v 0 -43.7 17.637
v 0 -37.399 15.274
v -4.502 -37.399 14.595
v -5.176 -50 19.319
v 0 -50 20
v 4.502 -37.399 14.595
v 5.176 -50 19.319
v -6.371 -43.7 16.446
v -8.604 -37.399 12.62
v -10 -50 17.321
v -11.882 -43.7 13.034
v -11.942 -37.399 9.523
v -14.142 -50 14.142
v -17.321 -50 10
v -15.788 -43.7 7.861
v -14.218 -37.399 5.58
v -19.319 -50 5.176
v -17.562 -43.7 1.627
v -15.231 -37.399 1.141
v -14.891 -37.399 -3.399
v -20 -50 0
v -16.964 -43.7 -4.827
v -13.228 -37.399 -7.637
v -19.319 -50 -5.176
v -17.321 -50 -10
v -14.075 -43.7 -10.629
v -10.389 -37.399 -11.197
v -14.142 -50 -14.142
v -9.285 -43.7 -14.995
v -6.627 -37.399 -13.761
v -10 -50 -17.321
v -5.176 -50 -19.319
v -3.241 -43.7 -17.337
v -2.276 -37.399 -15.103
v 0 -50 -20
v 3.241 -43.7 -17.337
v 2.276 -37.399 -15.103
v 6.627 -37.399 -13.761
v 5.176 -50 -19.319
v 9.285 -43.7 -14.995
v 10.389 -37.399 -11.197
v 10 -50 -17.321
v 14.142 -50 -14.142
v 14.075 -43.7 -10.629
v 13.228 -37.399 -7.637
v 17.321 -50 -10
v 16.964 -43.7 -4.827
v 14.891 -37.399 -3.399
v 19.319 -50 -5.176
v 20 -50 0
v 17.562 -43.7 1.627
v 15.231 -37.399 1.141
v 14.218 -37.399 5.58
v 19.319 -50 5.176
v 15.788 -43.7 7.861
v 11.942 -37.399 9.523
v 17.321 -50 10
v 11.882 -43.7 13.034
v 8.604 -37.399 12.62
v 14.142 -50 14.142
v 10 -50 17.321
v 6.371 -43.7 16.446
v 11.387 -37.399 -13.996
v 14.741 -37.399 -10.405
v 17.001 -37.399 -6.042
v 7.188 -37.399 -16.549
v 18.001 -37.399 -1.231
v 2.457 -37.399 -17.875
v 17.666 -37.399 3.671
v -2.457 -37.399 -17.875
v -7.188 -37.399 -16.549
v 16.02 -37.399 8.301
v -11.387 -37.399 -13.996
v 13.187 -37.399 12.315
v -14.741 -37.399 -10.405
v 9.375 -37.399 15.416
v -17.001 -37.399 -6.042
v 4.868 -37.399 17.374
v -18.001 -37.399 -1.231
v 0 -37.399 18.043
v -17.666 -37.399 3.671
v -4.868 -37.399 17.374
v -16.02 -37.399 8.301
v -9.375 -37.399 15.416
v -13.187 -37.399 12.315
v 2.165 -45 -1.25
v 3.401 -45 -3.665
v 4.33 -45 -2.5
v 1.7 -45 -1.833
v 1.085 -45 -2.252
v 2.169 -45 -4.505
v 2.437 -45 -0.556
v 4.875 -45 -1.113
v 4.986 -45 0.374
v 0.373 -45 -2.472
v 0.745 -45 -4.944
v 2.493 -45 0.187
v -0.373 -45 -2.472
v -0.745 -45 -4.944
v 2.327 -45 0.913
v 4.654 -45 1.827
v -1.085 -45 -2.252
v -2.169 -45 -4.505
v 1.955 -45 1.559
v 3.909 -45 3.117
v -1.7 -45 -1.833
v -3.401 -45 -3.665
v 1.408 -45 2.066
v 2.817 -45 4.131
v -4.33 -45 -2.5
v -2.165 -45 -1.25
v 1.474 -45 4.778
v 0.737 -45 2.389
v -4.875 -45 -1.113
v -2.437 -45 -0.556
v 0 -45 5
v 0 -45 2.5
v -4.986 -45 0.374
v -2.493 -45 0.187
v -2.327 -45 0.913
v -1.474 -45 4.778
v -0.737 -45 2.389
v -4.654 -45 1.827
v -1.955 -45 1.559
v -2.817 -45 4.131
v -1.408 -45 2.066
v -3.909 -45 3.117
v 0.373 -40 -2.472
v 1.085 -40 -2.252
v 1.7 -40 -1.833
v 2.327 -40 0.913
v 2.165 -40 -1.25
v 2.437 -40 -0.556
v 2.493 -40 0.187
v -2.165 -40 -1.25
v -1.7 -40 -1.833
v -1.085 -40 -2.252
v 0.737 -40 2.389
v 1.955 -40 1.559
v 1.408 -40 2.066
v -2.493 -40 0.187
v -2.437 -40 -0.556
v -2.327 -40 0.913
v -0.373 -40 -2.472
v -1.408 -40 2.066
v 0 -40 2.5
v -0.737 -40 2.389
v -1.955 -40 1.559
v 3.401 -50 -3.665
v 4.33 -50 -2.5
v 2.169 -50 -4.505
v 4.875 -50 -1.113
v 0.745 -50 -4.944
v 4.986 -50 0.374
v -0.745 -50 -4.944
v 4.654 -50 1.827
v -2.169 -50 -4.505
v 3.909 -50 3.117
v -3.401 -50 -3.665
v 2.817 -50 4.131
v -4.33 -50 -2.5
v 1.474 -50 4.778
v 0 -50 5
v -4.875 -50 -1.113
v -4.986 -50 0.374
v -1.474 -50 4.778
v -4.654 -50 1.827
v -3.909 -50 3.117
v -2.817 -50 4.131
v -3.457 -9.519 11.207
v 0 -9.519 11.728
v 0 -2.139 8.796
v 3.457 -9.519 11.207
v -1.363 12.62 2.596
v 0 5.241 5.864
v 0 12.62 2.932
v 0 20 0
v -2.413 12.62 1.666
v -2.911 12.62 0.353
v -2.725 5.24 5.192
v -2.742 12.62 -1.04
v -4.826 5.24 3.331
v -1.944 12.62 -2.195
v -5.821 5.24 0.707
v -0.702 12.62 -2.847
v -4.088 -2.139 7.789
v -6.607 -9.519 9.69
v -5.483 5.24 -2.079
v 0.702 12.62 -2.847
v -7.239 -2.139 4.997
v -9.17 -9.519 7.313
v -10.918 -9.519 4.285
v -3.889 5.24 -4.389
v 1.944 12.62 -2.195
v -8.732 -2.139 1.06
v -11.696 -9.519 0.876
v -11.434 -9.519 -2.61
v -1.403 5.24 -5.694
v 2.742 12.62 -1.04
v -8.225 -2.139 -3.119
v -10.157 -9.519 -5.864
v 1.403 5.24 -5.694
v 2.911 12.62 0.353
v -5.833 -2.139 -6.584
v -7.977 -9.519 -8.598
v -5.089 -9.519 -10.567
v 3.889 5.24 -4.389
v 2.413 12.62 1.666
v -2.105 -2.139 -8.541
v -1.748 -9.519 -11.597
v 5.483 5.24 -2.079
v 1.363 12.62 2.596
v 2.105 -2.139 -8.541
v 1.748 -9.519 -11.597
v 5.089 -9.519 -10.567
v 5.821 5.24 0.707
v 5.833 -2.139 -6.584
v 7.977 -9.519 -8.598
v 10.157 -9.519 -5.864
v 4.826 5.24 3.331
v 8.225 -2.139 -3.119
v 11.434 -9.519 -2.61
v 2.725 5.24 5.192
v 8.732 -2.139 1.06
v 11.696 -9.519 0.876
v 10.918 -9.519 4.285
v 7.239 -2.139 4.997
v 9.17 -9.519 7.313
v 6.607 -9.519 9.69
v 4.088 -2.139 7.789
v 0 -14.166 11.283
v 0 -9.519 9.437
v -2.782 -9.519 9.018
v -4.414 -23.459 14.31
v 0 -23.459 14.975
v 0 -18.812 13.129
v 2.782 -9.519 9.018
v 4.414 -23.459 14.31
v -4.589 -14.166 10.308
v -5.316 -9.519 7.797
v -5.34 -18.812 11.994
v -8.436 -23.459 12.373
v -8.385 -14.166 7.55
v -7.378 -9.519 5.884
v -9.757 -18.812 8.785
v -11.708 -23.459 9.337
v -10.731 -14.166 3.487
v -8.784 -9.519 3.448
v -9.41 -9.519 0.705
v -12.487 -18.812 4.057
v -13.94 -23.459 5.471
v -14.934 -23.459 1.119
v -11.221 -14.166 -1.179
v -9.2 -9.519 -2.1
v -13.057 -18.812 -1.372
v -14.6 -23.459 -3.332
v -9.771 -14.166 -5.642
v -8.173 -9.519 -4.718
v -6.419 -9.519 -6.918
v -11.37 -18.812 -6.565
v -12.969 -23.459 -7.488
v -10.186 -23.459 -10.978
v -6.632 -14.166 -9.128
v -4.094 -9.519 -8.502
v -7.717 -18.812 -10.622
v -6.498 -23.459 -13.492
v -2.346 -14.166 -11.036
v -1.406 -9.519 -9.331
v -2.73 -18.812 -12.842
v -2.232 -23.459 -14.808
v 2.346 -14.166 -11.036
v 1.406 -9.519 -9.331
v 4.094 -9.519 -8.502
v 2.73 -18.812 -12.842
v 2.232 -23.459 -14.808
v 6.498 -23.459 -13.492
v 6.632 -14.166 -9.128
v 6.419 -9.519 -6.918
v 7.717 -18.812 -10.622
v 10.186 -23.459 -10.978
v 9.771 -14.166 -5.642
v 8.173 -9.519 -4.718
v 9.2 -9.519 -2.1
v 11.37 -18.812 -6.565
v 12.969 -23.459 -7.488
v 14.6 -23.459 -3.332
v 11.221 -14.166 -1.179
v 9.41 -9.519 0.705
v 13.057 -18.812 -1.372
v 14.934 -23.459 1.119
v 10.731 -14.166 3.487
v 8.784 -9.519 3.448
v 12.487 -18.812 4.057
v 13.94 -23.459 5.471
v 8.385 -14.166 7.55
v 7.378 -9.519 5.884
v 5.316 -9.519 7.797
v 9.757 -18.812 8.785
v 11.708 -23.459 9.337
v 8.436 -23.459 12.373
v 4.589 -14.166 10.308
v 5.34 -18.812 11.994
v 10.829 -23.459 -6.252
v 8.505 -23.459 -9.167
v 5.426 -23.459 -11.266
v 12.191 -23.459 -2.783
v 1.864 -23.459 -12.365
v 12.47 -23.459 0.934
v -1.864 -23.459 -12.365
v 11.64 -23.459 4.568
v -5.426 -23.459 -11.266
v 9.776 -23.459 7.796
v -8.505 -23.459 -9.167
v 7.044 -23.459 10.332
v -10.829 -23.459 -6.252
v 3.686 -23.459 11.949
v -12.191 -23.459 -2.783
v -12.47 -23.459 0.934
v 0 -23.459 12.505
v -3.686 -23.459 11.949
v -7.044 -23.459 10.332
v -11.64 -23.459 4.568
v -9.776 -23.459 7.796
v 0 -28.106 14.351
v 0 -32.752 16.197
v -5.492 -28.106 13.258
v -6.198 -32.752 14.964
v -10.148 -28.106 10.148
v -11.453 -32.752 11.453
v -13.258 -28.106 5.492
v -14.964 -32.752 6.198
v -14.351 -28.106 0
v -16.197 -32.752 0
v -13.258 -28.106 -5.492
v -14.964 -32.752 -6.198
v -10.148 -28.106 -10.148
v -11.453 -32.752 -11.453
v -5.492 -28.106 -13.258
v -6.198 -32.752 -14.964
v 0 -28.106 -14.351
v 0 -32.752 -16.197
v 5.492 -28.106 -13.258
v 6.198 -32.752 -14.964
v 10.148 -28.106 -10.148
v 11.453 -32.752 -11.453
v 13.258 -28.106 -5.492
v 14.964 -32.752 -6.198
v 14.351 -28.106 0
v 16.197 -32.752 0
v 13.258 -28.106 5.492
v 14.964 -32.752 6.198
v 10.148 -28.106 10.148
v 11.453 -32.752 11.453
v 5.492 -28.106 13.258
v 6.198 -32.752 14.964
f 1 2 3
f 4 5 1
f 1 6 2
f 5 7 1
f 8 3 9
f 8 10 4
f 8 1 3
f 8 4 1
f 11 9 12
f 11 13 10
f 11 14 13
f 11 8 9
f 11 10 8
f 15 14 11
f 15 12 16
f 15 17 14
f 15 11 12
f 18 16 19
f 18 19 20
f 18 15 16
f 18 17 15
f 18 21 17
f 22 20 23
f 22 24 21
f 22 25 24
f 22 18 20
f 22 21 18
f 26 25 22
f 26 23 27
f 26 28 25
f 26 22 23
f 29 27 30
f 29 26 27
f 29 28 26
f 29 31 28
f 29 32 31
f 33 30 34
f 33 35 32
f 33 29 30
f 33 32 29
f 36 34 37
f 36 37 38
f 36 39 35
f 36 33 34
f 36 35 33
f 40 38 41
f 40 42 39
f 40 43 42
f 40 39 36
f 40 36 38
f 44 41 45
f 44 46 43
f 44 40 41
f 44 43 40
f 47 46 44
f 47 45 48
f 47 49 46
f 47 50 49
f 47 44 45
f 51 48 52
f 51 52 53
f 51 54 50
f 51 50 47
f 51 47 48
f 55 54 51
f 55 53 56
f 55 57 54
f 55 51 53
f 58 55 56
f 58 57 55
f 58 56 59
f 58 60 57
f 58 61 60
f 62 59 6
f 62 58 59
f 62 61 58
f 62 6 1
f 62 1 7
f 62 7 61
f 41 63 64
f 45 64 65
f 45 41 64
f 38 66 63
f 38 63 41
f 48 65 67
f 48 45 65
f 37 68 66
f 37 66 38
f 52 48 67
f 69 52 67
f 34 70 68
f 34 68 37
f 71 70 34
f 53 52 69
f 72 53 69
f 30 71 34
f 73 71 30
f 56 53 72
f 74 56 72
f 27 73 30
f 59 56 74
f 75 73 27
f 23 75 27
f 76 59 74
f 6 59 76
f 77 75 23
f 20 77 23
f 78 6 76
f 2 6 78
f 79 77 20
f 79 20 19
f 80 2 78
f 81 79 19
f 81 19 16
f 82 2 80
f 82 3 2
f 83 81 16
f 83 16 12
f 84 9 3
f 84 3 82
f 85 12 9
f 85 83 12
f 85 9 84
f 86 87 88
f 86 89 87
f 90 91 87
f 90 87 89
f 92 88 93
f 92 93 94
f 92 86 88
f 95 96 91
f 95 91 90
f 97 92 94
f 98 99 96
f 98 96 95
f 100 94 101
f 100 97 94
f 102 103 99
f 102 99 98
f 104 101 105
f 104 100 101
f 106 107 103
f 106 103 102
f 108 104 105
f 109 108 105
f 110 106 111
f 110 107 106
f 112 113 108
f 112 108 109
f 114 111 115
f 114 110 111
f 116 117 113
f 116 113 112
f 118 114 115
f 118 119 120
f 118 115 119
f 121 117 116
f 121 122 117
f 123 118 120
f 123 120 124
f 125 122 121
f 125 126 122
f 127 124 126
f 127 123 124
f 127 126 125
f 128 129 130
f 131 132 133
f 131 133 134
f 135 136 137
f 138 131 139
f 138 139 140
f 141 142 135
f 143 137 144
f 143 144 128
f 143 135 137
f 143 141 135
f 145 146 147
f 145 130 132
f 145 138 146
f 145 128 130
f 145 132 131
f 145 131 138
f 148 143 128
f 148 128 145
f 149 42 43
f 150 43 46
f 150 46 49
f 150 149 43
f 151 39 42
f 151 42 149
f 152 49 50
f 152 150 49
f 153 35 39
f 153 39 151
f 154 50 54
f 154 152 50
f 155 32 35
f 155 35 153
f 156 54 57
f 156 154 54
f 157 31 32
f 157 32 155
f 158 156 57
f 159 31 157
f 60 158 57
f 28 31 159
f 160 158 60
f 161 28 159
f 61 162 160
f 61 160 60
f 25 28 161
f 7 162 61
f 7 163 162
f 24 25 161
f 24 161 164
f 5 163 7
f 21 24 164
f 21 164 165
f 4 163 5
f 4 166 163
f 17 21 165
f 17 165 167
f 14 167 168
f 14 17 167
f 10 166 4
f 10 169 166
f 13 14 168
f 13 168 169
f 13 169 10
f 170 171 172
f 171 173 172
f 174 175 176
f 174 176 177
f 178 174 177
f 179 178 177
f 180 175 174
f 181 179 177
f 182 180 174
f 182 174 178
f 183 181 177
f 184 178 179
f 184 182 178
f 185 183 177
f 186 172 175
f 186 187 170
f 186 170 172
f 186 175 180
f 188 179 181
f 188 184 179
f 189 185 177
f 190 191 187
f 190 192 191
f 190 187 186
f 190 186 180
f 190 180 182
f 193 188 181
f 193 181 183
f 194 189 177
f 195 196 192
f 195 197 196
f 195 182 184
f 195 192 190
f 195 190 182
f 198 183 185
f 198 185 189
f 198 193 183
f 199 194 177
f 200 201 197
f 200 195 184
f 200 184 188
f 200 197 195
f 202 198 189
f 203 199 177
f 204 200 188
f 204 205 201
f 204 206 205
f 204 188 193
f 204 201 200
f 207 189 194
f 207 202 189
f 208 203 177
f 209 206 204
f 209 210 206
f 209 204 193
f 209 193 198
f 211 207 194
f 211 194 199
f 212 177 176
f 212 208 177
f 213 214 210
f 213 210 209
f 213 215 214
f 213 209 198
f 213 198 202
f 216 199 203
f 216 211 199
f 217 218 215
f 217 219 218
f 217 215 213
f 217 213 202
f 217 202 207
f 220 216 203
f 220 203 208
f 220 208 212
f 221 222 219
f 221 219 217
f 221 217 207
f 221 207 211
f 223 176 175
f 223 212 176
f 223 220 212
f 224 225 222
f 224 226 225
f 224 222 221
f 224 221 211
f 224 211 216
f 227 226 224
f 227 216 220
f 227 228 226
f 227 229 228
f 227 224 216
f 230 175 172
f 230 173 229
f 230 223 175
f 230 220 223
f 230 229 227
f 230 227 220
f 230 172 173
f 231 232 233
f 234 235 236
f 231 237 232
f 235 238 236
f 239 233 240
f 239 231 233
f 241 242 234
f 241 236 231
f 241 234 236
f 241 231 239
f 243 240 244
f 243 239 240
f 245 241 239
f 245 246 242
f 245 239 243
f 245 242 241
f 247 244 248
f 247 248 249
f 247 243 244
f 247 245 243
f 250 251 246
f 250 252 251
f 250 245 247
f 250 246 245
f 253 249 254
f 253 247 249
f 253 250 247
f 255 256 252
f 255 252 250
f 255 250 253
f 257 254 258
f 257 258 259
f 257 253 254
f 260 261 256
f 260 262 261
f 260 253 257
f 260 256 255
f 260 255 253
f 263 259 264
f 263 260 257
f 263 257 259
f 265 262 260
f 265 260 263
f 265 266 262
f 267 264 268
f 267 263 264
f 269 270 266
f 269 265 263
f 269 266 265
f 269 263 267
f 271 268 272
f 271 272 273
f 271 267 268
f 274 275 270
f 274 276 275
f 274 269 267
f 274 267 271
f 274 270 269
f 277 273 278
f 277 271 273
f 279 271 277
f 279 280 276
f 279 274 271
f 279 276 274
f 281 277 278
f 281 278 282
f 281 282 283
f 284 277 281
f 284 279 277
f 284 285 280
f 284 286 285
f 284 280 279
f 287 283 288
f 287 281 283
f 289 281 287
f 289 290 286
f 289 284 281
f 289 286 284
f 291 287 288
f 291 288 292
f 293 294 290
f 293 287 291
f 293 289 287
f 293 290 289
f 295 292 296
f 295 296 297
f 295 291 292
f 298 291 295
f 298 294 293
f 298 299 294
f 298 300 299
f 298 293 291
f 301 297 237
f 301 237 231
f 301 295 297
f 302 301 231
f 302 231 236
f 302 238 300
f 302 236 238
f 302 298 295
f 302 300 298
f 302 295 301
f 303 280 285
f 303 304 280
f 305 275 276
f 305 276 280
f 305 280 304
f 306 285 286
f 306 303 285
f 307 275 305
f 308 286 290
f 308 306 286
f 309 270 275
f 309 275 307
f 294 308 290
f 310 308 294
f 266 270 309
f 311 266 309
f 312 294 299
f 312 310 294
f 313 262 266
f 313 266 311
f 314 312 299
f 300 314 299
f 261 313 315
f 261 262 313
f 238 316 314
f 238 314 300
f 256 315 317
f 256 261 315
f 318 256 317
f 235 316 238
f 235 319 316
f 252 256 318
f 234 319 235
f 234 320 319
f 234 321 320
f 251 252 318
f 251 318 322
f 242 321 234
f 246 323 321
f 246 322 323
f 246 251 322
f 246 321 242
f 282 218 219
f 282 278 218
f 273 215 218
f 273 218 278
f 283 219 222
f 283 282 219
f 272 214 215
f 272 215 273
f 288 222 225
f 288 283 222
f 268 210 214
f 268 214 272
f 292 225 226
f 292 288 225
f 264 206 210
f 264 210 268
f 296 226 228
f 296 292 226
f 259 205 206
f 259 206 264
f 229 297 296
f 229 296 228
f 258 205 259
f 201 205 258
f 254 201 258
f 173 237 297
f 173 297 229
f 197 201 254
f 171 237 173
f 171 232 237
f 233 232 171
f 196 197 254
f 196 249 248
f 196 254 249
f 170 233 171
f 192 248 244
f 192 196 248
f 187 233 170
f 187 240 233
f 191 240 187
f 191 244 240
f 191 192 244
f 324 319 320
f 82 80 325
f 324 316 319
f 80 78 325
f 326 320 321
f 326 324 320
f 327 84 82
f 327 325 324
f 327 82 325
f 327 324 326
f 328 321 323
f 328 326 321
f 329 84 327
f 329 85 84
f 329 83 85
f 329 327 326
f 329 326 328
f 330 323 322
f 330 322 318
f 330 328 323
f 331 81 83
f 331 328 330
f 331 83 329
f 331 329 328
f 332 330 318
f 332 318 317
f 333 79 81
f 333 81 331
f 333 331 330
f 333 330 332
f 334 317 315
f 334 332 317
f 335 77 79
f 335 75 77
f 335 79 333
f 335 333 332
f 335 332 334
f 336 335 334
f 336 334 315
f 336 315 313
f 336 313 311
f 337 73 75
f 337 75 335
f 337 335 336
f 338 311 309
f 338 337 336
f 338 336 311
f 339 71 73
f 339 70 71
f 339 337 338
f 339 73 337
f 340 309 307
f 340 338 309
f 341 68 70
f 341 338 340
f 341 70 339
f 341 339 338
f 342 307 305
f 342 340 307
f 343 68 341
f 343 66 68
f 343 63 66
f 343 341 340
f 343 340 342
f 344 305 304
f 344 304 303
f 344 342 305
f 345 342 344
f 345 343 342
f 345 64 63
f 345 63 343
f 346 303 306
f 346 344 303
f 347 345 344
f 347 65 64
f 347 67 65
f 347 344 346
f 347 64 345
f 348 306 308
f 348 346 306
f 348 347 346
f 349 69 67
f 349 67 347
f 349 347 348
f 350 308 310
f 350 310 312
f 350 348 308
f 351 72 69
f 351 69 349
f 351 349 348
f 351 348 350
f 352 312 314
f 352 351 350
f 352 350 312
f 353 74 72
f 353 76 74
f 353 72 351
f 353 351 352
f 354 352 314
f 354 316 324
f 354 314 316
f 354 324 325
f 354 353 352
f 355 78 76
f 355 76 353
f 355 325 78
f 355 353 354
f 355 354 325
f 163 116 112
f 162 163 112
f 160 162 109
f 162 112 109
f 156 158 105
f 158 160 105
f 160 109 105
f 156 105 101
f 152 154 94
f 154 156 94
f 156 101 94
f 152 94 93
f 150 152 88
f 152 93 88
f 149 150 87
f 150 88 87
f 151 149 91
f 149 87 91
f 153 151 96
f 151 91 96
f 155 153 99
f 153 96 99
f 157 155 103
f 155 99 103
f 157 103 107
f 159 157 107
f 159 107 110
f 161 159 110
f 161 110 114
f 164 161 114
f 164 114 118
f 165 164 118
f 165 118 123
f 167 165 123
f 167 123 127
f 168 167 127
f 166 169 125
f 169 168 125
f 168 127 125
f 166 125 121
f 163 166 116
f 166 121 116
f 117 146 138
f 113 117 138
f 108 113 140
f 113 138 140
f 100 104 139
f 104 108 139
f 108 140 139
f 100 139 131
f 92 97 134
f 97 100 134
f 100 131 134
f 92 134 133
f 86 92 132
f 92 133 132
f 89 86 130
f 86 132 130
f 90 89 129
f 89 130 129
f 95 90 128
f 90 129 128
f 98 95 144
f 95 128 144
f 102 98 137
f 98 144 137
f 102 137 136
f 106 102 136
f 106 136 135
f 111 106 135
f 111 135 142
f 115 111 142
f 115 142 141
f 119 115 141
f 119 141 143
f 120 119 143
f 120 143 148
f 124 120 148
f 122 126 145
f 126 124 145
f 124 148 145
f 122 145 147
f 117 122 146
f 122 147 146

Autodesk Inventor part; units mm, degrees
sketch "Sketch1" plane through (0, 0, 0) normal (1, 0, 0) x (0, 1, 0)
  line L0 (20, 20) -> (-50, 20)
  line L1 (-50, 20) -> (-50, -20)
  line L2 (-50, -20) -> (20, -20)
  line L3 (20, -20) -> (20, 20)
  line L4 (-64, 0) -> (34, 0) projected
  line L5 (0, 28) -> (0, -28) projected
  line L6 (-50, 5) -> (-45, 5)
  line L7 (-45, 5) -> (-45, -5)
  line L8 (-45, -5) -> (-50, -5)
  line L9 (-50, -5) -> (-50, 5)
  line L10 (-45, 2.5) -> (-40, 2.5)
  line L11 (-40, 2.5) -> (-40, -2.5)
  line L12 (-40, -2.5) -> (-45, -2.5)
  line L13 (-45, -2.5) -> (-45, 2.5)
  line L14 (20, 0) -> (-9.519, 11.7284)
  line L15 (-9.519, 11.7284) -> (-9.519, 5)
  line L16 (20, 0) -> (-50, 0)
  line L17 (-9.519, 9.4368) -> (-23.459, 14.9754)
  line L18 (-23.459, 14.9754) -> (-23.459, 5)
  line L19 (-23.459, 12.5046) -> (-37.399, 18.0432)
  line L20 (-37.399, 18.0432) -> (-37.399, 5)
  line L21 (-37.399, 15.2739) -> (-50, 20)
  point P0 (0, 0)
  point P1 (-45, 0)
  point P2 (-40, 0)
  point P3 (0, 5)
  point P4 (0, 2.5)
  point P5 (0, 7.9463)
  dimension "d0" = 70
  dimension "d1" = 40
  dimension "d2" = 20
  dimension "d3" = 5
  dimension "d4" = 10
  dimension "d5" = 5
  dimension "d6" = 5
  dimension "d8" = 15
  dimension "d9" = 15
revolve "Revolution2" add sketch "Sketch1" angle 360 about axis through (0, 20, 0) along (0, -1, 0) contours L4 L5 L14 | L21 L20 L19 L18 L17 L15 L14 L5 L4 L11 L10 L7 L6 L1
properties part number "Tree_Leaves"
